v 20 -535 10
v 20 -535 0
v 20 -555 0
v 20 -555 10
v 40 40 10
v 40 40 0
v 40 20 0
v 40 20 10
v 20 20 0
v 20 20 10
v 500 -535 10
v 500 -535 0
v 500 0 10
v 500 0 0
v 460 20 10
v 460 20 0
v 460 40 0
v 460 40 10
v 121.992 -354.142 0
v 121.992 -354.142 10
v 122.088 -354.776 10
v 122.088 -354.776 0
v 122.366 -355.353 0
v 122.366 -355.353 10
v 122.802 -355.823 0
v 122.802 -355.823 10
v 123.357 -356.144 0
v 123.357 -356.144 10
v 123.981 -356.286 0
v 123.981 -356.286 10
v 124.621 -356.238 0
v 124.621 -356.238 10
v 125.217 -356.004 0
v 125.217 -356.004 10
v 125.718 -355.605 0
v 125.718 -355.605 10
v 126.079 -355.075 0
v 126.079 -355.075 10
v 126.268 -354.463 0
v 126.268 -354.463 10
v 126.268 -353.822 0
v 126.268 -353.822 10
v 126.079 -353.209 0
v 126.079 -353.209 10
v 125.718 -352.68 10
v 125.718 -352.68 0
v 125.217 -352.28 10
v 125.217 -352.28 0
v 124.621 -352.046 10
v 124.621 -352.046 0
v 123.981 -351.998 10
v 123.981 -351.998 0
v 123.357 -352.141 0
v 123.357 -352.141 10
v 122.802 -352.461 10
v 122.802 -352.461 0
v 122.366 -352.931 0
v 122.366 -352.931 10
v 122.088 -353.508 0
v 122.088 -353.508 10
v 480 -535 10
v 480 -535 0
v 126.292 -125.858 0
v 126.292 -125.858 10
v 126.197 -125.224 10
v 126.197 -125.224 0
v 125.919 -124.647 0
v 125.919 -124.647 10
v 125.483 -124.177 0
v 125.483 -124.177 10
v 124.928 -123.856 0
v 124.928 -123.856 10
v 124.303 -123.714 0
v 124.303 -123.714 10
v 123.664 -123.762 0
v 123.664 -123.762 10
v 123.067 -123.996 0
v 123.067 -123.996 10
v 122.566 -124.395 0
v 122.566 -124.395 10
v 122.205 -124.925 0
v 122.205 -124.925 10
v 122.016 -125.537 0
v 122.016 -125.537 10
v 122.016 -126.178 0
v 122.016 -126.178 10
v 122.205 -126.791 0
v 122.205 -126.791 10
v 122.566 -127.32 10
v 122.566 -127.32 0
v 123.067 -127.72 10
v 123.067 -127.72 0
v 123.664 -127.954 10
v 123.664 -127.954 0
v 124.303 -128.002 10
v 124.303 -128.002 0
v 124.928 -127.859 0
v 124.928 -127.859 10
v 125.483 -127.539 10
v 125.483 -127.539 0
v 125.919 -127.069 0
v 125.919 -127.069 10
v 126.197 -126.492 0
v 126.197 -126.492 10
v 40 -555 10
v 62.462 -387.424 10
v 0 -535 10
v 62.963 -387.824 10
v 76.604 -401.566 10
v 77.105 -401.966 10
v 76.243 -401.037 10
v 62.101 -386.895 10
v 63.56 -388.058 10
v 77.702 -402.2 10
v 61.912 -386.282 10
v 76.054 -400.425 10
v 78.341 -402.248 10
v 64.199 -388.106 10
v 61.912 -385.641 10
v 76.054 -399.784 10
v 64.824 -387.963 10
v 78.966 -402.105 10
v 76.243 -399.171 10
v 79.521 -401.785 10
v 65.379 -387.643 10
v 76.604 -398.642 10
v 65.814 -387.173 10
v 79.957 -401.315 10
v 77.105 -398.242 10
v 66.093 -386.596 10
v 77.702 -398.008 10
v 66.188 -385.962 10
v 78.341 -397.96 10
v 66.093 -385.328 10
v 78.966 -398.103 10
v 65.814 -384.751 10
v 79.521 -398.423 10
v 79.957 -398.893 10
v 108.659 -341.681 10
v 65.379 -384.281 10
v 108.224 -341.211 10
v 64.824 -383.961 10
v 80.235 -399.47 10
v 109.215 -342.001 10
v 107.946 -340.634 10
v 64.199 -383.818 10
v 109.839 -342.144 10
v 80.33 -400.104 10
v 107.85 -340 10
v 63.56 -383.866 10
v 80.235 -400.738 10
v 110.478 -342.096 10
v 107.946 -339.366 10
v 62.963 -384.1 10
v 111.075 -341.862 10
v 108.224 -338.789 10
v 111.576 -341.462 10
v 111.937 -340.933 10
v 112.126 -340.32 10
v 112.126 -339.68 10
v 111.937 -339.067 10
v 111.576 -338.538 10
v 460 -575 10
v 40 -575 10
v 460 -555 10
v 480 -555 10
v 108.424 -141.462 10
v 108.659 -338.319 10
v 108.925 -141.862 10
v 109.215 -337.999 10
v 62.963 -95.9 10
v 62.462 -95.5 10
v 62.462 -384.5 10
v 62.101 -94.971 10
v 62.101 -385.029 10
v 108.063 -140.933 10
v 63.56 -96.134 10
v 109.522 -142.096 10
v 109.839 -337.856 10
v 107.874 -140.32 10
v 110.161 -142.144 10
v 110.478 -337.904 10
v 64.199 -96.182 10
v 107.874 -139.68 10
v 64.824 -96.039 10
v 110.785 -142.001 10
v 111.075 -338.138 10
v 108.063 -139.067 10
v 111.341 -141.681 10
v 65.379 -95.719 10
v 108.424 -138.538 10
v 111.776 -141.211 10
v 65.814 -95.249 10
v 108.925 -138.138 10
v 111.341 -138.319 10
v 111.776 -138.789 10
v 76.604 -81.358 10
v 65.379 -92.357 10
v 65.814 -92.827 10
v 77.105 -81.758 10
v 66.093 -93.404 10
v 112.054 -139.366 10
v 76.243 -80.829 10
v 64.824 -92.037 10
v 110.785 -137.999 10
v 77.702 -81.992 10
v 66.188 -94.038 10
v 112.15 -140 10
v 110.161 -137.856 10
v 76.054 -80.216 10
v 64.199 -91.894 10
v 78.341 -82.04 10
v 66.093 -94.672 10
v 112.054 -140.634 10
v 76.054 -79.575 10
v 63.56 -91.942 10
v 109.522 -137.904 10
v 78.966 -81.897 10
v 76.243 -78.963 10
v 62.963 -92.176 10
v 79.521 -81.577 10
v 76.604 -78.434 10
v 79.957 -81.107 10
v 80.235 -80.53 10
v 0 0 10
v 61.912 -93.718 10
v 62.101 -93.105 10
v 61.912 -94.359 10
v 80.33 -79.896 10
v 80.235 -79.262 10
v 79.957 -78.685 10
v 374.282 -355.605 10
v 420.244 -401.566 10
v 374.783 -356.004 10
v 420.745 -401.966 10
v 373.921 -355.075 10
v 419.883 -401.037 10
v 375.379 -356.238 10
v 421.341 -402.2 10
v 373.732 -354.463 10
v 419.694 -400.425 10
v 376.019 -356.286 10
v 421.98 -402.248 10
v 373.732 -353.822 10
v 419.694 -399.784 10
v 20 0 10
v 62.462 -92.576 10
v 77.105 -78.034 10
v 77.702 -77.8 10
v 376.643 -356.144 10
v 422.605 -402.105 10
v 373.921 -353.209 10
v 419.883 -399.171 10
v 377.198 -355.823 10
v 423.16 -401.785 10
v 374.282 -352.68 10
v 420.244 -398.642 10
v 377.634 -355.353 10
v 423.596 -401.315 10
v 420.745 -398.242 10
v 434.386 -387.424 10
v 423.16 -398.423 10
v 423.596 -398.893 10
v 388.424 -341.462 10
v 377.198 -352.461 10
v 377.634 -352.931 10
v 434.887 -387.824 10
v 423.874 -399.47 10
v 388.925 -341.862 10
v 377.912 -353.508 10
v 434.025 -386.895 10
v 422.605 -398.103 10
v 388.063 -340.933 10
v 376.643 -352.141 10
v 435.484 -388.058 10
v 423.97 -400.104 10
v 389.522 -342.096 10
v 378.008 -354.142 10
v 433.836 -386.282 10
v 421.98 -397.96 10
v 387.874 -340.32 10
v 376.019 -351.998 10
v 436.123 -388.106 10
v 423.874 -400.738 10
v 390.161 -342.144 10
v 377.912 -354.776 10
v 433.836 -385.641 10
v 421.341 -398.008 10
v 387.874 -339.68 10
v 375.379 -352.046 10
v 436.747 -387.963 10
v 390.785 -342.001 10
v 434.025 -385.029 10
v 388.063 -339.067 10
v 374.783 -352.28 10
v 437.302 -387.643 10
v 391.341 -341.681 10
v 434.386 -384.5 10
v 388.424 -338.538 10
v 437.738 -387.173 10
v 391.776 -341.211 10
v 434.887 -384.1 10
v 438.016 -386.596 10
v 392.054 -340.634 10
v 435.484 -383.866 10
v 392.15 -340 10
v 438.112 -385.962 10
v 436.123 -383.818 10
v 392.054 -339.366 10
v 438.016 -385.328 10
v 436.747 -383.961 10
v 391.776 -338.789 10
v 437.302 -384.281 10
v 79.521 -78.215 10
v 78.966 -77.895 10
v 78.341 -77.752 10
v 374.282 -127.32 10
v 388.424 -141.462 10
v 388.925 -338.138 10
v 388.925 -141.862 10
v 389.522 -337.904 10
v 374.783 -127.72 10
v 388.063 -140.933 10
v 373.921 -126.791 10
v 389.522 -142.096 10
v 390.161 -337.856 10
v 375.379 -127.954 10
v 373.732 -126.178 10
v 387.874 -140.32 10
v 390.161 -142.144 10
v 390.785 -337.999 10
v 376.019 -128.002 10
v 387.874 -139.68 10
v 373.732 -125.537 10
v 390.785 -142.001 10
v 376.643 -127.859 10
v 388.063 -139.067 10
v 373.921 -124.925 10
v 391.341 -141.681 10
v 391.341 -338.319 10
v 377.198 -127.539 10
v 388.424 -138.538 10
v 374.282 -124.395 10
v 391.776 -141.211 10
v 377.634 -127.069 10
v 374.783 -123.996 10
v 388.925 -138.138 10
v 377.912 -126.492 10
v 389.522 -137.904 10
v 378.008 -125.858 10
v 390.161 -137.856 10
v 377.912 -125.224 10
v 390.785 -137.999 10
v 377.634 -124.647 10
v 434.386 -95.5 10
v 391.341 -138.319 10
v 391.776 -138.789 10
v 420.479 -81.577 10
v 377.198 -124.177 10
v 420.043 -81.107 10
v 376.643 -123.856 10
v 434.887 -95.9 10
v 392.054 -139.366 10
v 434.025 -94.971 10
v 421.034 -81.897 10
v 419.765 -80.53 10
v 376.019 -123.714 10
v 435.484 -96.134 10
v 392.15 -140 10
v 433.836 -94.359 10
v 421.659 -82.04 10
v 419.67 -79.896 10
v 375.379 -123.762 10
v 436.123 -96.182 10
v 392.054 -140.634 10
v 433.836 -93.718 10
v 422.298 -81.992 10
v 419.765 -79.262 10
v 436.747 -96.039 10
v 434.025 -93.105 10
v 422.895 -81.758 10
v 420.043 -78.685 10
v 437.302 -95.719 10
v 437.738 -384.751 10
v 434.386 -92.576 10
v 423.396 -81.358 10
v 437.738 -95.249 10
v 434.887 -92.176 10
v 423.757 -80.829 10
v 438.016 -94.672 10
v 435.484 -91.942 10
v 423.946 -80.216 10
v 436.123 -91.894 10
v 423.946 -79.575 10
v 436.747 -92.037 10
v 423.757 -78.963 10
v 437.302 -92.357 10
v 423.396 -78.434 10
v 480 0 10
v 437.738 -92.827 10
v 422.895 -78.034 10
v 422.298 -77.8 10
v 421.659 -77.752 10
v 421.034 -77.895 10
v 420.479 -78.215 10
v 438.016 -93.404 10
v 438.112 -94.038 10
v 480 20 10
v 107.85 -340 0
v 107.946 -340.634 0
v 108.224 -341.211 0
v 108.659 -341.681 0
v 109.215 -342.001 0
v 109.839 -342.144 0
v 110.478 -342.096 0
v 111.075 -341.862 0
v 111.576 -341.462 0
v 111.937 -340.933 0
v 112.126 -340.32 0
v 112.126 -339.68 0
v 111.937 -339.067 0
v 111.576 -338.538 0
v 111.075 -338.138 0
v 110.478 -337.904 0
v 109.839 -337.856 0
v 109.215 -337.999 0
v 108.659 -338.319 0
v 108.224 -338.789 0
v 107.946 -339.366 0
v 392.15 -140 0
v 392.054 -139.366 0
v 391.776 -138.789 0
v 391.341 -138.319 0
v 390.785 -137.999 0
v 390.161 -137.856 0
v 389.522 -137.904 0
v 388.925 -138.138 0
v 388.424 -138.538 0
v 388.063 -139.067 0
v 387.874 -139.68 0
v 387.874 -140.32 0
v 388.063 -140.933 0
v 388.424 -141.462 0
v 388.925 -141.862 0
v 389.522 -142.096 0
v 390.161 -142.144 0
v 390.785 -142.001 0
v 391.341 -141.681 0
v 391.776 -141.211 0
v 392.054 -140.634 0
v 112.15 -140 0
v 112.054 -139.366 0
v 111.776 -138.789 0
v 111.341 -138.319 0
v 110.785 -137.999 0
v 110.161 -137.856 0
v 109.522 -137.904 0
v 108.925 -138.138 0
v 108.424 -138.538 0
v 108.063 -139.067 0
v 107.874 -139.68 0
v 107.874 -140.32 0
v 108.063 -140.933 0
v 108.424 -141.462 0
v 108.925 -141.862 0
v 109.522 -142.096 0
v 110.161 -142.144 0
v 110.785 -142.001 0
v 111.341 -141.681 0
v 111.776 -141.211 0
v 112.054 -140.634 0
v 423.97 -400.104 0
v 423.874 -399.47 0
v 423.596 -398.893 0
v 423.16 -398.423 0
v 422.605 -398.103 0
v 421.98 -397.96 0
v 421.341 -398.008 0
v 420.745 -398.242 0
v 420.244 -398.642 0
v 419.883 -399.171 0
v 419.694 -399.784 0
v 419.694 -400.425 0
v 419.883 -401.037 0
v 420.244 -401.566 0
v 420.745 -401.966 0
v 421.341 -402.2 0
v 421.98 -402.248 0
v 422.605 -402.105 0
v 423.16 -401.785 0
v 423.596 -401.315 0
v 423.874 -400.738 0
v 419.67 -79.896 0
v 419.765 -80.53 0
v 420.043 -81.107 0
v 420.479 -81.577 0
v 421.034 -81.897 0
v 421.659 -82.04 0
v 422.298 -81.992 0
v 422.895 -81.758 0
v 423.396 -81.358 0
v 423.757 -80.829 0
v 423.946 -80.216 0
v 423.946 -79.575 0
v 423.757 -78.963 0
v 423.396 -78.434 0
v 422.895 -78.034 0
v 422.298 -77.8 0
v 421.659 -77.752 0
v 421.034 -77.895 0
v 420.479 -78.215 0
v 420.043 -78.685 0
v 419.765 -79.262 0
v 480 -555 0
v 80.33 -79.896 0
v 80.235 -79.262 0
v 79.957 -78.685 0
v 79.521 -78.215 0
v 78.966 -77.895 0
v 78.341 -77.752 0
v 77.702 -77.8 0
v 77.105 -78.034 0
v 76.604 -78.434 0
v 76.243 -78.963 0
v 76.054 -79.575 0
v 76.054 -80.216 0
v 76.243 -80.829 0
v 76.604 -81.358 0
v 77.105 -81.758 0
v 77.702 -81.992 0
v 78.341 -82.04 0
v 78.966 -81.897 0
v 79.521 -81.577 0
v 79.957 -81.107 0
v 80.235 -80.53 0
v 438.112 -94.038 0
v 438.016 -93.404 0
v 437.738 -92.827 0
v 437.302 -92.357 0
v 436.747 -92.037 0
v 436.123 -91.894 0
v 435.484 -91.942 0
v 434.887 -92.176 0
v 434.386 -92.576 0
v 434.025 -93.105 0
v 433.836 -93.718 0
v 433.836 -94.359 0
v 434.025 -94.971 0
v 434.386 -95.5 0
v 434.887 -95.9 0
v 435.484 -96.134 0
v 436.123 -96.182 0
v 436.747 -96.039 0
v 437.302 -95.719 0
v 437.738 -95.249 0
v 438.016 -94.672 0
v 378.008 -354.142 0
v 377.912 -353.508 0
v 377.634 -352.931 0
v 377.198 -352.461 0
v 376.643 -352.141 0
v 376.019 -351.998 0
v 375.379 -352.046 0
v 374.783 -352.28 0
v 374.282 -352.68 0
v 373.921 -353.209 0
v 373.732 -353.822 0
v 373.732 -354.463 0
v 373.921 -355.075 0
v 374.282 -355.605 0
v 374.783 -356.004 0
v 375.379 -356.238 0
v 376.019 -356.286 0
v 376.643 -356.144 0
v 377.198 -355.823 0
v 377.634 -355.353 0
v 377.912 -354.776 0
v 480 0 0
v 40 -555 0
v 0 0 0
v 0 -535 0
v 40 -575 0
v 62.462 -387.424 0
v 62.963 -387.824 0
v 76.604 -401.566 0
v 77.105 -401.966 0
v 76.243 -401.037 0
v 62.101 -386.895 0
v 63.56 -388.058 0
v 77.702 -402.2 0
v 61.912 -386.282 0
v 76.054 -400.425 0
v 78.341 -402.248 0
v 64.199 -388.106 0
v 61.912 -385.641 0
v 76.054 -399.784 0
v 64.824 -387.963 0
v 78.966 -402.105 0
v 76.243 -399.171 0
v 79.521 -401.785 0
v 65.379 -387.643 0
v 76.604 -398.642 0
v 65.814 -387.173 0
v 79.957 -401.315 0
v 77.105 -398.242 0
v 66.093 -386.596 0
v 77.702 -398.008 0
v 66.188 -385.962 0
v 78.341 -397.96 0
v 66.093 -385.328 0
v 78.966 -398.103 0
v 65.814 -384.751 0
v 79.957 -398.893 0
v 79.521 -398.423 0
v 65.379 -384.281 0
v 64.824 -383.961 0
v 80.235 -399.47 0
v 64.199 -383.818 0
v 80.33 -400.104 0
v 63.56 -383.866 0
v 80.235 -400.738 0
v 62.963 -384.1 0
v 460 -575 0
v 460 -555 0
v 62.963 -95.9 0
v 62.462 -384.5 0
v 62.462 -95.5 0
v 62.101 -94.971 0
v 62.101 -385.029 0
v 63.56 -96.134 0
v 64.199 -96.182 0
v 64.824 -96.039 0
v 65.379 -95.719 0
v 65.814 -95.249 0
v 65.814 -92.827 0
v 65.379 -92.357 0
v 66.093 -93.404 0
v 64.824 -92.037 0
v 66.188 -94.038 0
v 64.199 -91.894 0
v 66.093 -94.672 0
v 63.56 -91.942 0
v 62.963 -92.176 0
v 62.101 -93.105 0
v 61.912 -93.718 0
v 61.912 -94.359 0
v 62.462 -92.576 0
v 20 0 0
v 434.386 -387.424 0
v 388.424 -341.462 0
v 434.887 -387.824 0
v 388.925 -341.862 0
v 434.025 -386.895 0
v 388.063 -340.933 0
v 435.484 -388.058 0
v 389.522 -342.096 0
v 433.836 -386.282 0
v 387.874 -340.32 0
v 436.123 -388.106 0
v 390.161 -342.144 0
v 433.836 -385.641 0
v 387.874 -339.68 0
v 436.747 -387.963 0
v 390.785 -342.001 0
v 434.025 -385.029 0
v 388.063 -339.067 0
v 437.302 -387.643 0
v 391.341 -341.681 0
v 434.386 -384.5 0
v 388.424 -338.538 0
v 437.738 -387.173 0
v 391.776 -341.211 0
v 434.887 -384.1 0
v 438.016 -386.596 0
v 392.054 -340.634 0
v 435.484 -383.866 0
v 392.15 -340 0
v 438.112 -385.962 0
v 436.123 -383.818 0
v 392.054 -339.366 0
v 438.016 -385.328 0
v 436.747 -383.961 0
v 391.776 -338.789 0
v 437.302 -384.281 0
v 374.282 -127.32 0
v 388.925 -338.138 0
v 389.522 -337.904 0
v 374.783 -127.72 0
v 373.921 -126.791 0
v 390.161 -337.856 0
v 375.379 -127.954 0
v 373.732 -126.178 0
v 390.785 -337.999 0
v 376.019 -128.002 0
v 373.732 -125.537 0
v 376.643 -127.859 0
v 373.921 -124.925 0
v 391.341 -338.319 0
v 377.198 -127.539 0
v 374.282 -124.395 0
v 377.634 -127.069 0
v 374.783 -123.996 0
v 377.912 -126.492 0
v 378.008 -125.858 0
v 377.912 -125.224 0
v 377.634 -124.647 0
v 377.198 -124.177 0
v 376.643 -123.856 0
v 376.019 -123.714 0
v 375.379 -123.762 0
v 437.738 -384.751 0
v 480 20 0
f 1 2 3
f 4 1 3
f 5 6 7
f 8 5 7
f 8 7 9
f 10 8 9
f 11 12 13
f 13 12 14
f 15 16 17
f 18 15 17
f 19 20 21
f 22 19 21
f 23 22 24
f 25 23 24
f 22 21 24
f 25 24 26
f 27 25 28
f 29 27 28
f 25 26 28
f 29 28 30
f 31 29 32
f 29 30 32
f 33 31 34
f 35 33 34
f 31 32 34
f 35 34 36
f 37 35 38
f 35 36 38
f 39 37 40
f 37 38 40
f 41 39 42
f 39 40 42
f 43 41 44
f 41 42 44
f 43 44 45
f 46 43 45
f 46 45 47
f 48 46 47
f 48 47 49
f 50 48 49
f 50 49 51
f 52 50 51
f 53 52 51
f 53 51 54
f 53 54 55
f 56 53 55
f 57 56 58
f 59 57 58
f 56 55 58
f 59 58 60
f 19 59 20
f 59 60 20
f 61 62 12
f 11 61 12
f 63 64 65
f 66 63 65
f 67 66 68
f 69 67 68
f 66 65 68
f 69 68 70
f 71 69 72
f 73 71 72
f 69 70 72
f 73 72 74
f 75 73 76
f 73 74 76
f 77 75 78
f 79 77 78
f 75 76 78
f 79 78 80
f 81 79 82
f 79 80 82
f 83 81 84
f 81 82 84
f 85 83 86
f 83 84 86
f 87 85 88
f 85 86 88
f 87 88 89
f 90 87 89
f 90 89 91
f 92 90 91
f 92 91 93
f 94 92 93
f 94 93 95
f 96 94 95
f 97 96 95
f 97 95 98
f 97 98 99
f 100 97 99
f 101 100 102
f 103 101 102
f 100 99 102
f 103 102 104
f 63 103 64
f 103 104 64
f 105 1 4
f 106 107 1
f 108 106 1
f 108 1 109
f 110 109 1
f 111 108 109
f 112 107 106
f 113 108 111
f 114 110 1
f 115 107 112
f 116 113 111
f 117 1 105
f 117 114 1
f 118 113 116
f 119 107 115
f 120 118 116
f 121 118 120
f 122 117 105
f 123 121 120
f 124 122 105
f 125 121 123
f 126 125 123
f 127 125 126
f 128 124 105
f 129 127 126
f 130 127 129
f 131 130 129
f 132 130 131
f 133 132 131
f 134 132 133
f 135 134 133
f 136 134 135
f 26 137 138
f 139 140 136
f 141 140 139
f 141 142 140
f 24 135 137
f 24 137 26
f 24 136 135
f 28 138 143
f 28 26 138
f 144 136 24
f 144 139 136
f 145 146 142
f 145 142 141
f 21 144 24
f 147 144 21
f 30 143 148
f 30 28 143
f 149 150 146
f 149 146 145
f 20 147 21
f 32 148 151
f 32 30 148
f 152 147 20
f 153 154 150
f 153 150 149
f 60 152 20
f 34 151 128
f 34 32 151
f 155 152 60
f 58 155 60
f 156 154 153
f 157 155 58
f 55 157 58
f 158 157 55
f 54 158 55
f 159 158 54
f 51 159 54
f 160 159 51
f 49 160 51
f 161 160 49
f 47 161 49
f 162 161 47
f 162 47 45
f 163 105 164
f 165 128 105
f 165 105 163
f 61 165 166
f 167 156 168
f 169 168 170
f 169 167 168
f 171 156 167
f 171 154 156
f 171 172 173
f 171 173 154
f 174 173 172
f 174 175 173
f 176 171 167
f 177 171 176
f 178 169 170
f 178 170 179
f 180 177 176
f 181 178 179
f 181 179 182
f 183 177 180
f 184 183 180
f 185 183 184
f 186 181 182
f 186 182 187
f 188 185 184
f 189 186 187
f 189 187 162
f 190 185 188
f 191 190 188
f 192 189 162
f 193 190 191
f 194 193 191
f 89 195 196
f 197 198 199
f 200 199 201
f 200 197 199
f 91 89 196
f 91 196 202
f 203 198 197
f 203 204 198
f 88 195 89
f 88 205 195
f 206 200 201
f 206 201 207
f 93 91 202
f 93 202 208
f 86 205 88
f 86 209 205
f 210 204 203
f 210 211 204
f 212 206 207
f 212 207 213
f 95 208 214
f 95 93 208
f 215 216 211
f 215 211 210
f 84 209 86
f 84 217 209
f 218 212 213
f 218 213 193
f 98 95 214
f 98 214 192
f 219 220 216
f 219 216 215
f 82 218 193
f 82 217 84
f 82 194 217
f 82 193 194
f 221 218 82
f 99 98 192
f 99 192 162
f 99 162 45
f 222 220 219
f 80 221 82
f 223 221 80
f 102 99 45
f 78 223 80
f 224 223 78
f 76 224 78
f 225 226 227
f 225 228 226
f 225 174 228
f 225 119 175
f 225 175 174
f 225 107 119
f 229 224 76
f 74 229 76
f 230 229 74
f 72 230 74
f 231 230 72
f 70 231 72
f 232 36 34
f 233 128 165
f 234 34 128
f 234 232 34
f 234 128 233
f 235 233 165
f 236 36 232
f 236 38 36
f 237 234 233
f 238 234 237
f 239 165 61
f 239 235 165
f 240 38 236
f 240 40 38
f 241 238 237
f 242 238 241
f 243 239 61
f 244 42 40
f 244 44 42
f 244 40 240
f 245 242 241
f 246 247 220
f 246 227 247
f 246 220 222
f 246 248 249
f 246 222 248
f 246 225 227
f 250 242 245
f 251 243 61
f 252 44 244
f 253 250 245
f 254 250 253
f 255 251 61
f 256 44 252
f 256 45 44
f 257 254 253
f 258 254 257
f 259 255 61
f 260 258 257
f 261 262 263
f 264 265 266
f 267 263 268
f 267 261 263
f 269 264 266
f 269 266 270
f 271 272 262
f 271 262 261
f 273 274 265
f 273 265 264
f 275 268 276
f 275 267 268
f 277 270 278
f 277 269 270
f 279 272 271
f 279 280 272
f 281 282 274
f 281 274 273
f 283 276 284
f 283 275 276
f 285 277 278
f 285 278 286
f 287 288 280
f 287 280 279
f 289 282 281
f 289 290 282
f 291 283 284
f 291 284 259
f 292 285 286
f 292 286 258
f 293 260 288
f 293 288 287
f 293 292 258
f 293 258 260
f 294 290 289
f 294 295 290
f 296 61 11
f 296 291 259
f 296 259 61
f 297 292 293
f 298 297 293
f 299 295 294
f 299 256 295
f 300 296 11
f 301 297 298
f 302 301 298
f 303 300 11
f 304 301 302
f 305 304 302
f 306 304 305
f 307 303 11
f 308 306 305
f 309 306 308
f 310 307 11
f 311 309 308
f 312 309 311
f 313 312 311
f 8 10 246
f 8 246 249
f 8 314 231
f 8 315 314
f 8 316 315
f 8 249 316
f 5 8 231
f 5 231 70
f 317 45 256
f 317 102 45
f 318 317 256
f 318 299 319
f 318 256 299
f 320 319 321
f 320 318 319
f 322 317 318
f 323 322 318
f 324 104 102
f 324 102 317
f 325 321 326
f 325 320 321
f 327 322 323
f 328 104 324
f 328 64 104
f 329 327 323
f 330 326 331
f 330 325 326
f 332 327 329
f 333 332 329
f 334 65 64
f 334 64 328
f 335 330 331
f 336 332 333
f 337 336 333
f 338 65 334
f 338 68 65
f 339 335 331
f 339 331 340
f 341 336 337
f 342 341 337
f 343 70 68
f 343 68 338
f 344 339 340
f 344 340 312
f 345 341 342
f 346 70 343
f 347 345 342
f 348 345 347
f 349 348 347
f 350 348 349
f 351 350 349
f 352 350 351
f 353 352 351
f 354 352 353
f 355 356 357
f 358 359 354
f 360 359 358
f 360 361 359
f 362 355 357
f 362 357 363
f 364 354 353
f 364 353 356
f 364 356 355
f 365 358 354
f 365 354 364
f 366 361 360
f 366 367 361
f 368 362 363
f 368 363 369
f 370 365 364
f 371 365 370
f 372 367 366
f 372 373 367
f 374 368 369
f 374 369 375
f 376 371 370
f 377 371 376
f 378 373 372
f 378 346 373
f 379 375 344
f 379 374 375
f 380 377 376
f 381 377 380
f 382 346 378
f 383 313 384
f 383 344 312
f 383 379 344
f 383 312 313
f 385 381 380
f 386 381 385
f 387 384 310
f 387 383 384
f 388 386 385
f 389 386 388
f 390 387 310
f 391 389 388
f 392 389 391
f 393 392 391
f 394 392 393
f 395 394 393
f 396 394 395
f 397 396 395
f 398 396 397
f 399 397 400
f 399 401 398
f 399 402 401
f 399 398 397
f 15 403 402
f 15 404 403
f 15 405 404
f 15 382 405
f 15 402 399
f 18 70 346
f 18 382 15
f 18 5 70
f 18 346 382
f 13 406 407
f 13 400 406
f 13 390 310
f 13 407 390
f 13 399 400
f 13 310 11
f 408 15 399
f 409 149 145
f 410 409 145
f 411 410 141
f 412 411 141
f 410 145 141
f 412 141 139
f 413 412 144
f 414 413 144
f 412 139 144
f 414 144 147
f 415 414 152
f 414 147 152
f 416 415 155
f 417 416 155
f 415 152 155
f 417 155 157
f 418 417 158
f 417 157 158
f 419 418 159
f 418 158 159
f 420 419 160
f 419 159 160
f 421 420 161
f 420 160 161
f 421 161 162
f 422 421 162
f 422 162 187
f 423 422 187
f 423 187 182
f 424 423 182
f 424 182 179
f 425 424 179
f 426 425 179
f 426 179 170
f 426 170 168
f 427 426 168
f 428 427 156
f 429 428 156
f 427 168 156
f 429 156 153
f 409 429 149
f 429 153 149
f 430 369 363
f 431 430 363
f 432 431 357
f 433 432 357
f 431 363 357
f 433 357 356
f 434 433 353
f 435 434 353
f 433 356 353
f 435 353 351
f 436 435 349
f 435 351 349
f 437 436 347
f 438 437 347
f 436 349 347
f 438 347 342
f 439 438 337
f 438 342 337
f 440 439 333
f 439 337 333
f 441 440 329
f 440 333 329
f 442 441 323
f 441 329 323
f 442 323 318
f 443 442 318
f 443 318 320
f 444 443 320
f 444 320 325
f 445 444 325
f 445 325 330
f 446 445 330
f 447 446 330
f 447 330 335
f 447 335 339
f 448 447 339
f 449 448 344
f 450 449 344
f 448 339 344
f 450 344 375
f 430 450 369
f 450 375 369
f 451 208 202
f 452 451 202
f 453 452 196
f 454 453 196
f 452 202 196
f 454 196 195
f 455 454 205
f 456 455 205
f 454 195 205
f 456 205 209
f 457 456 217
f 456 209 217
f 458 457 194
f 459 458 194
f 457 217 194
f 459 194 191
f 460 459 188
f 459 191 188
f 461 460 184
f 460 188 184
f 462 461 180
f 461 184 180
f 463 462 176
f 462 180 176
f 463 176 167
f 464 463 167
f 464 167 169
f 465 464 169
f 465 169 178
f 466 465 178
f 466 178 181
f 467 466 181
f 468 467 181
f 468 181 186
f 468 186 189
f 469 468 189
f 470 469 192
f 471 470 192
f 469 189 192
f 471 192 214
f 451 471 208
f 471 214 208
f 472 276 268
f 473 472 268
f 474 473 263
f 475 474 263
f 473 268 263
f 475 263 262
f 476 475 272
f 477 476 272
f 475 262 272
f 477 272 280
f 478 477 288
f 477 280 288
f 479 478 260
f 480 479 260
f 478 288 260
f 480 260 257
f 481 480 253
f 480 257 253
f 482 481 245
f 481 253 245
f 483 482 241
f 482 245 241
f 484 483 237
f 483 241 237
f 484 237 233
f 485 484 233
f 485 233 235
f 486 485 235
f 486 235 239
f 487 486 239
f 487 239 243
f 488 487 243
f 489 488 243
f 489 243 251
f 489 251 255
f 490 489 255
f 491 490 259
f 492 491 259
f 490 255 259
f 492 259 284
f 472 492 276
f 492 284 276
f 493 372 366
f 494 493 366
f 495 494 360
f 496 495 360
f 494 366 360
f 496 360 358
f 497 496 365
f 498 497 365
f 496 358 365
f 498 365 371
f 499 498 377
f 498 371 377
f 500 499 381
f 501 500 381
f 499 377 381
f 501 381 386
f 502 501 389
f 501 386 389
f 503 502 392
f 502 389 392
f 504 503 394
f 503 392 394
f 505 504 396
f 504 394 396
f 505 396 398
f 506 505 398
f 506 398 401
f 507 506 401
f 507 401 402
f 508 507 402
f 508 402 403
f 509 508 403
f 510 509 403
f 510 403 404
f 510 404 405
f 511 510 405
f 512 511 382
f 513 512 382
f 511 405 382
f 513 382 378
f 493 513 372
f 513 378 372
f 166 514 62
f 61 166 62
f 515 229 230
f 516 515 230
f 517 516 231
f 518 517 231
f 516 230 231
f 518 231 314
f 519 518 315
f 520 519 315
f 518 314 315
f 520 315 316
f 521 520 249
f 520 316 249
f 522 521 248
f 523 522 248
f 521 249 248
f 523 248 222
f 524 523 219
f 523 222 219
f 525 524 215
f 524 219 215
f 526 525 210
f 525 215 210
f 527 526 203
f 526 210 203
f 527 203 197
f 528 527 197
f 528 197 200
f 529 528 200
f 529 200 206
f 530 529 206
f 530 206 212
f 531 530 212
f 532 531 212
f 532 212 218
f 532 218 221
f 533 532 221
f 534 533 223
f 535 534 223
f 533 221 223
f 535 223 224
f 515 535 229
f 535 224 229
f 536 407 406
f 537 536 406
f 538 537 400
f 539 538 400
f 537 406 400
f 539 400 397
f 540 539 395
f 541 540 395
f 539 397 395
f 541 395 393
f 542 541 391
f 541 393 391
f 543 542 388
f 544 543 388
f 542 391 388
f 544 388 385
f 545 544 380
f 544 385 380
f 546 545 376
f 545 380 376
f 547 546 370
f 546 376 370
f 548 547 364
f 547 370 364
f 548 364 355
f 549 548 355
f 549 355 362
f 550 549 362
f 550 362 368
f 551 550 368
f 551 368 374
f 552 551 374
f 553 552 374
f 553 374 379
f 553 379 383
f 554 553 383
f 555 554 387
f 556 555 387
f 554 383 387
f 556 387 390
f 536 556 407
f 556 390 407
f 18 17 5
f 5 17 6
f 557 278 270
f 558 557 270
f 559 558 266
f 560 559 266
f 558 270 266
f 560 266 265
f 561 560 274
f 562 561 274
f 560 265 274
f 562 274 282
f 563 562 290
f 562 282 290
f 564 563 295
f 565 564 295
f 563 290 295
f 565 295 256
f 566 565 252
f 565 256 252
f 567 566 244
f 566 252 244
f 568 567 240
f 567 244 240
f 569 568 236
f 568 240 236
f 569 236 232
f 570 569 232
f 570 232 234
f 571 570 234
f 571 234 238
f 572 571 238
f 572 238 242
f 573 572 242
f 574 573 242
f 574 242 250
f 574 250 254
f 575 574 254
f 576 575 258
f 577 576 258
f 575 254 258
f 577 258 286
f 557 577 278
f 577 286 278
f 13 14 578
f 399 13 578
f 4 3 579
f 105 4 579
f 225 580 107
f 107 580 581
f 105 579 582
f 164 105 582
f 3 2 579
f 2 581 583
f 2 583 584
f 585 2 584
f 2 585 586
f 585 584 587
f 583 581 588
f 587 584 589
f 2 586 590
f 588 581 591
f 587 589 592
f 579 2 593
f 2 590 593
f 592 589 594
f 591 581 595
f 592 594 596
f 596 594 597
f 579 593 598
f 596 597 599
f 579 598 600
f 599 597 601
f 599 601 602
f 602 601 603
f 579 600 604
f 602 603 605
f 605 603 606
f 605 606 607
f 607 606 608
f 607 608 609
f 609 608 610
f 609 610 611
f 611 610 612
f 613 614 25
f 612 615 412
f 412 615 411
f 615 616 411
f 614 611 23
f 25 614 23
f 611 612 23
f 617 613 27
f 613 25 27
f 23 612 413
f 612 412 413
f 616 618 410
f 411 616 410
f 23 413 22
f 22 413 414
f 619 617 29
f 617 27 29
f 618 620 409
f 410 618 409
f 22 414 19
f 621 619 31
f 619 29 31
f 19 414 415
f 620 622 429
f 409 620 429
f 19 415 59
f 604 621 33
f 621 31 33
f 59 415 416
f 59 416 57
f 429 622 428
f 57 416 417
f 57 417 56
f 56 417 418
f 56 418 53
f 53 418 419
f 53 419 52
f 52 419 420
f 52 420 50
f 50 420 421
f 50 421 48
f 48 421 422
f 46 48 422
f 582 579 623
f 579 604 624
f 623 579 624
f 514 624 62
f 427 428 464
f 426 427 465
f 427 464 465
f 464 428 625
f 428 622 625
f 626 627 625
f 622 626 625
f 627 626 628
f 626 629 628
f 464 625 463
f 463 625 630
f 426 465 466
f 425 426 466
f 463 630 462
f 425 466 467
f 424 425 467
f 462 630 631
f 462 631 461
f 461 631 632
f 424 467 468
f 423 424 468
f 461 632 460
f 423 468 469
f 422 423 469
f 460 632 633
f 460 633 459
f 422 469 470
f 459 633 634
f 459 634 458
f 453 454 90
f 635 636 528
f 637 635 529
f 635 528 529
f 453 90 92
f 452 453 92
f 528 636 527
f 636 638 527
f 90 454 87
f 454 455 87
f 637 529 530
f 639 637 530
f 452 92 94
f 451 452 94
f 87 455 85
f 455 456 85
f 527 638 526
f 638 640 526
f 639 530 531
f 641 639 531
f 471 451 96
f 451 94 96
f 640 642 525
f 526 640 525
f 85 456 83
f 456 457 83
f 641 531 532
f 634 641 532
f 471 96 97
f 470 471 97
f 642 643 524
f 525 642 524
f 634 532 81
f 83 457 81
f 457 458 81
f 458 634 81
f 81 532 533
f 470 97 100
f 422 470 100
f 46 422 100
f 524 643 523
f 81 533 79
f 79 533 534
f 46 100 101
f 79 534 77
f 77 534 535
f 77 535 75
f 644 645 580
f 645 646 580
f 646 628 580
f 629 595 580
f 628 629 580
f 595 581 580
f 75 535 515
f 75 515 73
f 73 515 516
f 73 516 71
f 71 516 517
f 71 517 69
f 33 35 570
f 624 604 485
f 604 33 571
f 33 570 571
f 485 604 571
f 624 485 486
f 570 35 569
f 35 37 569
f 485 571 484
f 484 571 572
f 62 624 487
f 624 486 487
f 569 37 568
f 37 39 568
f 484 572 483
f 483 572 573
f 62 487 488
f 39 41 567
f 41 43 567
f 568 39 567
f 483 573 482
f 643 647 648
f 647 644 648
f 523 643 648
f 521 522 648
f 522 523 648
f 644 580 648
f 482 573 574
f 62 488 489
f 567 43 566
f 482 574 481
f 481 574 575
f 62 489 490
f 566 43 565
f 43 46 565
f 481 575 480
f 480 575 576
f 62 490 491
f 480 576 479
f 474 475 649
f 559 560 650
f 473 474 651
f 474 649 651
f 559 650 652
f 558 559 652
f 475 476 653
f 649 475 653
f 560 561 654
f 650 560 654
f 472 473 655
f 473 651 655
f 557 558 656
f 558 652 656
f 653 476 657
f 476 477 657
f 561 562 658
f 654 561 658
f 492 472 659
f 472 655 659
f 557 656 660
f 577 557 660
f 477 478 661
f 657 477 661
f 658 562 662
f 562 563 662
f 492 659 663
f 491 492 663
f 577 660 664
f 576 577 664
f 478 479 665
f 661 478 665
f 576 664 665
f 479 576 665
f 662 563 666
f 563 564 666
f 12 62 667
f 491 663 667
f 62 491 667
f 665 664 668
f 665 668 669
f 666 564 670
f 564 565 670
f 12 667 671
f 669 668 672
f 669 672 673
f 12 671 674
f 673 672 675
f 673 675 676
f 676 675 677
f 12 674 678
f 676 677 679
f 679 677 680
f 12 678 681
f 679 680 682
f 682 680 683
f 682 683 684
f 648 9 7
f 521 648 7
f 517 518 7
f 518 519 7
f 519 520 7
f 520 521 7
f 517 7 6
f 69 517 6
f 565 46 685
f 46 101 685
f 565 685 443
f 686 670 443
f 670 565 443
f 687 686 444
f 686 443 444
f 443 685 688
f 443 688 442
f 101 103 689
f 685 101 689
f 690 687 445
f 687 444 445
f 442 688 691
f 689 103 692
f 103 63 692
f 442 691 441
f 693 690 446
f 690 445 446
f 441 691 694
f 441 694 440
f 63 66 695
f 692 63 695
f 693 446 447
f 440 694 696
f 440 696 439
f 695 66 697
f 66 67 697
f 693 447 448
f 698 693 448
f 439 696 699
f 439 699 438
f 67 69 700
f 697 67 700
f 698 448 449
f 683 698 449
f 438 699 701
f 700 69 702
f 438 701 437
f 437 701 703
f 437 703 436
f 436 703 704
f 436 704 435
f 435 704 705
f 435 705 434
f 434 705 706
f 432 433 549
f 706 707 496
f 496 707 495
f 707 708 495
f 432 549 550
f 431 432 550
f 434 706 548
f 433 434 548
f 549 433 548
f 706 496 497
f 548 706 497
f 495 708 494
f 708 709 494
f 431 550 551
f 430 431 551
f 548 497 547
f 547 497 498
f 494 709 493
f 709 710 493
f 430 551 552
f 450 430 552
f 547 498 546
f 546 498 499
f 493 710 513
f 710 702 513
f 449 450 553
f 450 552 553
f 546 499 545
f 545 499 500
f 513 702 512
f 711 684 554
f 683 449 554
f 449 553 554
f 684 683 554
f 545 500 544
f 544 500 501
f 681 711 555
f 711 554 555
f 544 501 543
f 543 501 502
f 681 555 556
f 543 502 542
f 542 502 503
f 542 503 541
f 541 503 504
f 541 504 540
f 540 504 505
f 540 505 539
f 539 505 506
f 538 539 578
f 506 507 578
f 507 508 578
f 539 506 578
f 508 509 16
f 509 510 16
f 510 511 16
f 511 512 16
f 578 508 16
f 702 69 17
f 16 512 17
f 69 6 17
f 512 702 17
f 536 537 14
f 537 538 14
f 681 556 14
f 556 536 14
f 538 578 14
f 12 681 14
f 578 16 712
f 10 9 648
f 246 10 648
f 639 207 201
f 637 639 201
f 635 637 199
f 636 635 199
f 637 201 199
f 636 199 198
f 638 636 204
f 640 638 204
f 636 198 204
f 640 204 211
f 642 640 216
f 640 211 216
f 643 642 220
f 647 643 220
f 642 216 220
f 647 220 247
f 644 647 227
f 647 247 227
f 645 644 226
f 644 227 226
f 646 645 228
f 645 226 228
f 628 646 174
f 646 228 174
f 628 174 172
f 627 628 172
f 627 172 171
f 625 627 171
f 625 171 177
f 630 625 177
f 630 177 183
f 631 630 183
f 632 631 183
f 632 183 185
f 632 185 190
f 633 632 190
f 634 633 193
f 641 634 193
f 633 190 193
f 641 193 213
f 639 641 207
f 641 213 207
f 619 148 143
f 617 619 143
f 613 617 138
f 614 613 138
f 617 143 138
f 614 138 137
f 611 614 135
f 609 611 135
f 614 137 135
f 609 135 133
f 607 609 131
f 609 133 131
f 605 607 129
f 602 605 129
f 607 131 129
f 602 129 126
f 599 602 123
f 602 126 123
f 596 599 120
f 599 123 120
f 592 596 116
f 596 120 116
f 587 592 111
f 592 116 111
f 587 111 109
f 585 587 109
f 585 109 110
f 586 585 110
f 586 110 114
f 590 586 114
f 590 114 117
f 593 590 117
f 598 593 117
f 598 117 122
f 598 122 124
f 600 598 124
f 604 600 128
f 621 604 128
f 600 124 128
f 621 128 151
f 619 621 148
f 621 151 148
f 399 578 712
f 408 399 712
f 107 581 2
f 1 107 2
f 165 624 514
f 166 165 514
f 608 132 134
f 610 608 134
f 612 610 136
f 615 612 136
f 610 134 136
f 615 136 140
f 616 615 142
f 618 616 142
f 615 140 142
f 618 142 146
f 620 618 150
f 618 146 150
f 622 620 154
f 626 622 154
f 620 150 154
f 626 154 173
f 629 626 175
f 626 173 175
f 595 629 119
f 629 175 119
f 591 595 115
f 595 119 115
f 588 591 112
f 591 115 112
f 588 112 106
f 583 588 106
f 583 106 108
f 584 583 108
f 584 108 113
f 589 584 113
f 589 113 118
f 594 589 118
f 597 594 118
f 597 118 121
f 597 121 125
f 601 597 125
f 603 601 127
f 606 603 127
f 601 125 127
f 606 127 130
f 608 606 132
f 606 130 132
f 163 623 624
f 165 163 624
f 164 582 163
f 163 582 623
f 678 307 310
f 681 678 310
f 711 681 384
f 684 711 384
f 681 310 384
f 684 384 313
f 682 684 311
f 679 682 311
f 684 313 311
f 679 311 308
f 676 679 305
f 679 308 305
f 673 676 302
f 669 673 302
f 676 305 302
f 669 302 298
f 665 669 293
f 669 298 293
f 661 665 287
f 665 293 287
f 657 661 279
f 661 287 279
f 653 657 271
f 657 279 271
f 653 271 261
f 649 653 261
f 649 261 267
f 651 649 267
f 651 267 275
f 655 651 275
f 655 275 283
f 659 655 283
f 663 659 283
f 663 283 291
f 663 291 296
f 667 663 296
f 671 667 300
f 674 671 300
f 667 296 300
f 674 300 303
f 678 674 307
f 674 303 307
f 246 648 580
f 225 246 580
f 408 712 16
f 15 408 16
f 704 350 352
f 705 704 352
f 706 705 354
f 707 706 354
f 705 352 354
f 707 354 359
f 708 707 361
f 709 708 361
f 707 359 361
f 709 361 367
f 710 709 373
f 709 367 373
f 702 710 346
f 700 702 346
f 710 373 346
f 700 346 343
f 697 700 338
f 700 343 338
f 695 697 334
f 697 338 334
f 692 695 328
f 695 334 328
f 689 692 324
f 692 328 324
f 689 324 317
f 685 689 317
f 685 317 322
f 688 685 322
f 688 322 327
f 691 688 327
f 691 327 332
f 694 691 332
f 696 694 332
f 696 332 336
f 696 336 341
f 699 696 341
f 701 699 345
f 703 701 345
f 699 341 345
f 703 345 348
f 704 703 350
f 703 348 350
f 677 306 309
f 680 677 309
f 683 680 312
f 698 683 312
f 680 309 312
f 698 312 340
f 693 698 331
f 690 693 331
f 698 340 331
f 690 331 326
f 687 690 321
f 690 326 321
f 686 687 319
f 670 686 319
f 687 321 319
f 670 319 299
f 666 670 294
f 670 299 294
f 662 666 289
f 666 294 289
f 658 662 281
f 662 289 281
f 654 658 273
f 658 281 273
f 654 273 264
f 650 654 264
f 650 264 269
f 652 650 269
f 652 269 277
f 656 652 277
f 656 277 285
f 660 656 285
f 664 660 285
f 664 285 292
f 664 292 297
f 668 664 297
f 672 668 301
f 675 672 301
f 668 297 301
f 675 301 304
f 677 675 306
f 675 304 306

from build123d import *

# Parameters (mm, degrees)
EXTRUDE_1_DEPTH     = 10
SKETCH_2_R          = 2.15
CUT_EXTRUDE_1_DEPTH = 10


with BuildPart() as part:
    # 草图1 → 凸台-拉伸1 (new body)
    with BuildSketch(Plane.XY):
        Polygon((0, 0), (0, -535), (20, -535), (20, -555), (40, -555), (40, -575), (460, -575), (460, -555), (480, -555), (480, -535), (500, -535), (500, 0), (480, 0), (480, 20), (460, 20), (460, 40), (40, 40), (40, 20), (20, 20), (20, 0), align=None)
    extrude(amount=EXTRUDE_1_DEPTH)

    # 草图2 → 切除-拉伸1 (cut)
    with BuildSketch(Plane.XY.offset(10)):
        with Locations((64.038059223, -94.038059223)):
            Circle(SKETCH_2_R)
        with Locations((78.180194847, -79.895923599)):
            Circle(SKETCH_2_R)
        with Locations((110, -140)):
            Circle(SKETCH_2_R)
        with Locations((124.142135624, -125.857864376)):
            Circle(SKETCH_2_R)
        with Locations((390, -140)):
            Circle(SKETCH_2_R)
        with Locations((375.857864376, -125.857864376)):
            Circle(SKETCH_2_R)
        with Locations((435.961940777, -94.038059223)):
            Circle(SKETCH_2_R)
        with Locations(Location((421.819805153, -79.895923599, 0), (0, 0, 180))):
            Circle(SKETCH_2_R)
        with Locations((421.819805153, -400.104076401)):
            Circle(SKETCH_2_R)
        with Locations((435.961940777, -385.961940777)):
            Circle(SKETCH_2_R)
        with Locations((375.857864376, -354.142135624)):
            Circle(SKETCH_2_R)
        with Locations((390, -340)):
            Circle(SKETCH_2_R)
        with Locations(Location((124.142135624, -354.142135624, 0), (0, 0, 180))):
            Circle(SKETCH_2_R)
        with Locations(Location((110, -340, 0), (0, 0, 180))):
            Circle(SKETCH_2_R)
        with Locations((78.180194847, -400.104076401)):
            Circle(SKETCH_2_R)
        with Locations((64.038059223, -385.961940777)):
            Circle(SKETCH_2_R)
    extrude(amount=-CUT_EXTRUDE_1_DEPTH, mode=Mode.SUBTRACT)


solid = part.part
